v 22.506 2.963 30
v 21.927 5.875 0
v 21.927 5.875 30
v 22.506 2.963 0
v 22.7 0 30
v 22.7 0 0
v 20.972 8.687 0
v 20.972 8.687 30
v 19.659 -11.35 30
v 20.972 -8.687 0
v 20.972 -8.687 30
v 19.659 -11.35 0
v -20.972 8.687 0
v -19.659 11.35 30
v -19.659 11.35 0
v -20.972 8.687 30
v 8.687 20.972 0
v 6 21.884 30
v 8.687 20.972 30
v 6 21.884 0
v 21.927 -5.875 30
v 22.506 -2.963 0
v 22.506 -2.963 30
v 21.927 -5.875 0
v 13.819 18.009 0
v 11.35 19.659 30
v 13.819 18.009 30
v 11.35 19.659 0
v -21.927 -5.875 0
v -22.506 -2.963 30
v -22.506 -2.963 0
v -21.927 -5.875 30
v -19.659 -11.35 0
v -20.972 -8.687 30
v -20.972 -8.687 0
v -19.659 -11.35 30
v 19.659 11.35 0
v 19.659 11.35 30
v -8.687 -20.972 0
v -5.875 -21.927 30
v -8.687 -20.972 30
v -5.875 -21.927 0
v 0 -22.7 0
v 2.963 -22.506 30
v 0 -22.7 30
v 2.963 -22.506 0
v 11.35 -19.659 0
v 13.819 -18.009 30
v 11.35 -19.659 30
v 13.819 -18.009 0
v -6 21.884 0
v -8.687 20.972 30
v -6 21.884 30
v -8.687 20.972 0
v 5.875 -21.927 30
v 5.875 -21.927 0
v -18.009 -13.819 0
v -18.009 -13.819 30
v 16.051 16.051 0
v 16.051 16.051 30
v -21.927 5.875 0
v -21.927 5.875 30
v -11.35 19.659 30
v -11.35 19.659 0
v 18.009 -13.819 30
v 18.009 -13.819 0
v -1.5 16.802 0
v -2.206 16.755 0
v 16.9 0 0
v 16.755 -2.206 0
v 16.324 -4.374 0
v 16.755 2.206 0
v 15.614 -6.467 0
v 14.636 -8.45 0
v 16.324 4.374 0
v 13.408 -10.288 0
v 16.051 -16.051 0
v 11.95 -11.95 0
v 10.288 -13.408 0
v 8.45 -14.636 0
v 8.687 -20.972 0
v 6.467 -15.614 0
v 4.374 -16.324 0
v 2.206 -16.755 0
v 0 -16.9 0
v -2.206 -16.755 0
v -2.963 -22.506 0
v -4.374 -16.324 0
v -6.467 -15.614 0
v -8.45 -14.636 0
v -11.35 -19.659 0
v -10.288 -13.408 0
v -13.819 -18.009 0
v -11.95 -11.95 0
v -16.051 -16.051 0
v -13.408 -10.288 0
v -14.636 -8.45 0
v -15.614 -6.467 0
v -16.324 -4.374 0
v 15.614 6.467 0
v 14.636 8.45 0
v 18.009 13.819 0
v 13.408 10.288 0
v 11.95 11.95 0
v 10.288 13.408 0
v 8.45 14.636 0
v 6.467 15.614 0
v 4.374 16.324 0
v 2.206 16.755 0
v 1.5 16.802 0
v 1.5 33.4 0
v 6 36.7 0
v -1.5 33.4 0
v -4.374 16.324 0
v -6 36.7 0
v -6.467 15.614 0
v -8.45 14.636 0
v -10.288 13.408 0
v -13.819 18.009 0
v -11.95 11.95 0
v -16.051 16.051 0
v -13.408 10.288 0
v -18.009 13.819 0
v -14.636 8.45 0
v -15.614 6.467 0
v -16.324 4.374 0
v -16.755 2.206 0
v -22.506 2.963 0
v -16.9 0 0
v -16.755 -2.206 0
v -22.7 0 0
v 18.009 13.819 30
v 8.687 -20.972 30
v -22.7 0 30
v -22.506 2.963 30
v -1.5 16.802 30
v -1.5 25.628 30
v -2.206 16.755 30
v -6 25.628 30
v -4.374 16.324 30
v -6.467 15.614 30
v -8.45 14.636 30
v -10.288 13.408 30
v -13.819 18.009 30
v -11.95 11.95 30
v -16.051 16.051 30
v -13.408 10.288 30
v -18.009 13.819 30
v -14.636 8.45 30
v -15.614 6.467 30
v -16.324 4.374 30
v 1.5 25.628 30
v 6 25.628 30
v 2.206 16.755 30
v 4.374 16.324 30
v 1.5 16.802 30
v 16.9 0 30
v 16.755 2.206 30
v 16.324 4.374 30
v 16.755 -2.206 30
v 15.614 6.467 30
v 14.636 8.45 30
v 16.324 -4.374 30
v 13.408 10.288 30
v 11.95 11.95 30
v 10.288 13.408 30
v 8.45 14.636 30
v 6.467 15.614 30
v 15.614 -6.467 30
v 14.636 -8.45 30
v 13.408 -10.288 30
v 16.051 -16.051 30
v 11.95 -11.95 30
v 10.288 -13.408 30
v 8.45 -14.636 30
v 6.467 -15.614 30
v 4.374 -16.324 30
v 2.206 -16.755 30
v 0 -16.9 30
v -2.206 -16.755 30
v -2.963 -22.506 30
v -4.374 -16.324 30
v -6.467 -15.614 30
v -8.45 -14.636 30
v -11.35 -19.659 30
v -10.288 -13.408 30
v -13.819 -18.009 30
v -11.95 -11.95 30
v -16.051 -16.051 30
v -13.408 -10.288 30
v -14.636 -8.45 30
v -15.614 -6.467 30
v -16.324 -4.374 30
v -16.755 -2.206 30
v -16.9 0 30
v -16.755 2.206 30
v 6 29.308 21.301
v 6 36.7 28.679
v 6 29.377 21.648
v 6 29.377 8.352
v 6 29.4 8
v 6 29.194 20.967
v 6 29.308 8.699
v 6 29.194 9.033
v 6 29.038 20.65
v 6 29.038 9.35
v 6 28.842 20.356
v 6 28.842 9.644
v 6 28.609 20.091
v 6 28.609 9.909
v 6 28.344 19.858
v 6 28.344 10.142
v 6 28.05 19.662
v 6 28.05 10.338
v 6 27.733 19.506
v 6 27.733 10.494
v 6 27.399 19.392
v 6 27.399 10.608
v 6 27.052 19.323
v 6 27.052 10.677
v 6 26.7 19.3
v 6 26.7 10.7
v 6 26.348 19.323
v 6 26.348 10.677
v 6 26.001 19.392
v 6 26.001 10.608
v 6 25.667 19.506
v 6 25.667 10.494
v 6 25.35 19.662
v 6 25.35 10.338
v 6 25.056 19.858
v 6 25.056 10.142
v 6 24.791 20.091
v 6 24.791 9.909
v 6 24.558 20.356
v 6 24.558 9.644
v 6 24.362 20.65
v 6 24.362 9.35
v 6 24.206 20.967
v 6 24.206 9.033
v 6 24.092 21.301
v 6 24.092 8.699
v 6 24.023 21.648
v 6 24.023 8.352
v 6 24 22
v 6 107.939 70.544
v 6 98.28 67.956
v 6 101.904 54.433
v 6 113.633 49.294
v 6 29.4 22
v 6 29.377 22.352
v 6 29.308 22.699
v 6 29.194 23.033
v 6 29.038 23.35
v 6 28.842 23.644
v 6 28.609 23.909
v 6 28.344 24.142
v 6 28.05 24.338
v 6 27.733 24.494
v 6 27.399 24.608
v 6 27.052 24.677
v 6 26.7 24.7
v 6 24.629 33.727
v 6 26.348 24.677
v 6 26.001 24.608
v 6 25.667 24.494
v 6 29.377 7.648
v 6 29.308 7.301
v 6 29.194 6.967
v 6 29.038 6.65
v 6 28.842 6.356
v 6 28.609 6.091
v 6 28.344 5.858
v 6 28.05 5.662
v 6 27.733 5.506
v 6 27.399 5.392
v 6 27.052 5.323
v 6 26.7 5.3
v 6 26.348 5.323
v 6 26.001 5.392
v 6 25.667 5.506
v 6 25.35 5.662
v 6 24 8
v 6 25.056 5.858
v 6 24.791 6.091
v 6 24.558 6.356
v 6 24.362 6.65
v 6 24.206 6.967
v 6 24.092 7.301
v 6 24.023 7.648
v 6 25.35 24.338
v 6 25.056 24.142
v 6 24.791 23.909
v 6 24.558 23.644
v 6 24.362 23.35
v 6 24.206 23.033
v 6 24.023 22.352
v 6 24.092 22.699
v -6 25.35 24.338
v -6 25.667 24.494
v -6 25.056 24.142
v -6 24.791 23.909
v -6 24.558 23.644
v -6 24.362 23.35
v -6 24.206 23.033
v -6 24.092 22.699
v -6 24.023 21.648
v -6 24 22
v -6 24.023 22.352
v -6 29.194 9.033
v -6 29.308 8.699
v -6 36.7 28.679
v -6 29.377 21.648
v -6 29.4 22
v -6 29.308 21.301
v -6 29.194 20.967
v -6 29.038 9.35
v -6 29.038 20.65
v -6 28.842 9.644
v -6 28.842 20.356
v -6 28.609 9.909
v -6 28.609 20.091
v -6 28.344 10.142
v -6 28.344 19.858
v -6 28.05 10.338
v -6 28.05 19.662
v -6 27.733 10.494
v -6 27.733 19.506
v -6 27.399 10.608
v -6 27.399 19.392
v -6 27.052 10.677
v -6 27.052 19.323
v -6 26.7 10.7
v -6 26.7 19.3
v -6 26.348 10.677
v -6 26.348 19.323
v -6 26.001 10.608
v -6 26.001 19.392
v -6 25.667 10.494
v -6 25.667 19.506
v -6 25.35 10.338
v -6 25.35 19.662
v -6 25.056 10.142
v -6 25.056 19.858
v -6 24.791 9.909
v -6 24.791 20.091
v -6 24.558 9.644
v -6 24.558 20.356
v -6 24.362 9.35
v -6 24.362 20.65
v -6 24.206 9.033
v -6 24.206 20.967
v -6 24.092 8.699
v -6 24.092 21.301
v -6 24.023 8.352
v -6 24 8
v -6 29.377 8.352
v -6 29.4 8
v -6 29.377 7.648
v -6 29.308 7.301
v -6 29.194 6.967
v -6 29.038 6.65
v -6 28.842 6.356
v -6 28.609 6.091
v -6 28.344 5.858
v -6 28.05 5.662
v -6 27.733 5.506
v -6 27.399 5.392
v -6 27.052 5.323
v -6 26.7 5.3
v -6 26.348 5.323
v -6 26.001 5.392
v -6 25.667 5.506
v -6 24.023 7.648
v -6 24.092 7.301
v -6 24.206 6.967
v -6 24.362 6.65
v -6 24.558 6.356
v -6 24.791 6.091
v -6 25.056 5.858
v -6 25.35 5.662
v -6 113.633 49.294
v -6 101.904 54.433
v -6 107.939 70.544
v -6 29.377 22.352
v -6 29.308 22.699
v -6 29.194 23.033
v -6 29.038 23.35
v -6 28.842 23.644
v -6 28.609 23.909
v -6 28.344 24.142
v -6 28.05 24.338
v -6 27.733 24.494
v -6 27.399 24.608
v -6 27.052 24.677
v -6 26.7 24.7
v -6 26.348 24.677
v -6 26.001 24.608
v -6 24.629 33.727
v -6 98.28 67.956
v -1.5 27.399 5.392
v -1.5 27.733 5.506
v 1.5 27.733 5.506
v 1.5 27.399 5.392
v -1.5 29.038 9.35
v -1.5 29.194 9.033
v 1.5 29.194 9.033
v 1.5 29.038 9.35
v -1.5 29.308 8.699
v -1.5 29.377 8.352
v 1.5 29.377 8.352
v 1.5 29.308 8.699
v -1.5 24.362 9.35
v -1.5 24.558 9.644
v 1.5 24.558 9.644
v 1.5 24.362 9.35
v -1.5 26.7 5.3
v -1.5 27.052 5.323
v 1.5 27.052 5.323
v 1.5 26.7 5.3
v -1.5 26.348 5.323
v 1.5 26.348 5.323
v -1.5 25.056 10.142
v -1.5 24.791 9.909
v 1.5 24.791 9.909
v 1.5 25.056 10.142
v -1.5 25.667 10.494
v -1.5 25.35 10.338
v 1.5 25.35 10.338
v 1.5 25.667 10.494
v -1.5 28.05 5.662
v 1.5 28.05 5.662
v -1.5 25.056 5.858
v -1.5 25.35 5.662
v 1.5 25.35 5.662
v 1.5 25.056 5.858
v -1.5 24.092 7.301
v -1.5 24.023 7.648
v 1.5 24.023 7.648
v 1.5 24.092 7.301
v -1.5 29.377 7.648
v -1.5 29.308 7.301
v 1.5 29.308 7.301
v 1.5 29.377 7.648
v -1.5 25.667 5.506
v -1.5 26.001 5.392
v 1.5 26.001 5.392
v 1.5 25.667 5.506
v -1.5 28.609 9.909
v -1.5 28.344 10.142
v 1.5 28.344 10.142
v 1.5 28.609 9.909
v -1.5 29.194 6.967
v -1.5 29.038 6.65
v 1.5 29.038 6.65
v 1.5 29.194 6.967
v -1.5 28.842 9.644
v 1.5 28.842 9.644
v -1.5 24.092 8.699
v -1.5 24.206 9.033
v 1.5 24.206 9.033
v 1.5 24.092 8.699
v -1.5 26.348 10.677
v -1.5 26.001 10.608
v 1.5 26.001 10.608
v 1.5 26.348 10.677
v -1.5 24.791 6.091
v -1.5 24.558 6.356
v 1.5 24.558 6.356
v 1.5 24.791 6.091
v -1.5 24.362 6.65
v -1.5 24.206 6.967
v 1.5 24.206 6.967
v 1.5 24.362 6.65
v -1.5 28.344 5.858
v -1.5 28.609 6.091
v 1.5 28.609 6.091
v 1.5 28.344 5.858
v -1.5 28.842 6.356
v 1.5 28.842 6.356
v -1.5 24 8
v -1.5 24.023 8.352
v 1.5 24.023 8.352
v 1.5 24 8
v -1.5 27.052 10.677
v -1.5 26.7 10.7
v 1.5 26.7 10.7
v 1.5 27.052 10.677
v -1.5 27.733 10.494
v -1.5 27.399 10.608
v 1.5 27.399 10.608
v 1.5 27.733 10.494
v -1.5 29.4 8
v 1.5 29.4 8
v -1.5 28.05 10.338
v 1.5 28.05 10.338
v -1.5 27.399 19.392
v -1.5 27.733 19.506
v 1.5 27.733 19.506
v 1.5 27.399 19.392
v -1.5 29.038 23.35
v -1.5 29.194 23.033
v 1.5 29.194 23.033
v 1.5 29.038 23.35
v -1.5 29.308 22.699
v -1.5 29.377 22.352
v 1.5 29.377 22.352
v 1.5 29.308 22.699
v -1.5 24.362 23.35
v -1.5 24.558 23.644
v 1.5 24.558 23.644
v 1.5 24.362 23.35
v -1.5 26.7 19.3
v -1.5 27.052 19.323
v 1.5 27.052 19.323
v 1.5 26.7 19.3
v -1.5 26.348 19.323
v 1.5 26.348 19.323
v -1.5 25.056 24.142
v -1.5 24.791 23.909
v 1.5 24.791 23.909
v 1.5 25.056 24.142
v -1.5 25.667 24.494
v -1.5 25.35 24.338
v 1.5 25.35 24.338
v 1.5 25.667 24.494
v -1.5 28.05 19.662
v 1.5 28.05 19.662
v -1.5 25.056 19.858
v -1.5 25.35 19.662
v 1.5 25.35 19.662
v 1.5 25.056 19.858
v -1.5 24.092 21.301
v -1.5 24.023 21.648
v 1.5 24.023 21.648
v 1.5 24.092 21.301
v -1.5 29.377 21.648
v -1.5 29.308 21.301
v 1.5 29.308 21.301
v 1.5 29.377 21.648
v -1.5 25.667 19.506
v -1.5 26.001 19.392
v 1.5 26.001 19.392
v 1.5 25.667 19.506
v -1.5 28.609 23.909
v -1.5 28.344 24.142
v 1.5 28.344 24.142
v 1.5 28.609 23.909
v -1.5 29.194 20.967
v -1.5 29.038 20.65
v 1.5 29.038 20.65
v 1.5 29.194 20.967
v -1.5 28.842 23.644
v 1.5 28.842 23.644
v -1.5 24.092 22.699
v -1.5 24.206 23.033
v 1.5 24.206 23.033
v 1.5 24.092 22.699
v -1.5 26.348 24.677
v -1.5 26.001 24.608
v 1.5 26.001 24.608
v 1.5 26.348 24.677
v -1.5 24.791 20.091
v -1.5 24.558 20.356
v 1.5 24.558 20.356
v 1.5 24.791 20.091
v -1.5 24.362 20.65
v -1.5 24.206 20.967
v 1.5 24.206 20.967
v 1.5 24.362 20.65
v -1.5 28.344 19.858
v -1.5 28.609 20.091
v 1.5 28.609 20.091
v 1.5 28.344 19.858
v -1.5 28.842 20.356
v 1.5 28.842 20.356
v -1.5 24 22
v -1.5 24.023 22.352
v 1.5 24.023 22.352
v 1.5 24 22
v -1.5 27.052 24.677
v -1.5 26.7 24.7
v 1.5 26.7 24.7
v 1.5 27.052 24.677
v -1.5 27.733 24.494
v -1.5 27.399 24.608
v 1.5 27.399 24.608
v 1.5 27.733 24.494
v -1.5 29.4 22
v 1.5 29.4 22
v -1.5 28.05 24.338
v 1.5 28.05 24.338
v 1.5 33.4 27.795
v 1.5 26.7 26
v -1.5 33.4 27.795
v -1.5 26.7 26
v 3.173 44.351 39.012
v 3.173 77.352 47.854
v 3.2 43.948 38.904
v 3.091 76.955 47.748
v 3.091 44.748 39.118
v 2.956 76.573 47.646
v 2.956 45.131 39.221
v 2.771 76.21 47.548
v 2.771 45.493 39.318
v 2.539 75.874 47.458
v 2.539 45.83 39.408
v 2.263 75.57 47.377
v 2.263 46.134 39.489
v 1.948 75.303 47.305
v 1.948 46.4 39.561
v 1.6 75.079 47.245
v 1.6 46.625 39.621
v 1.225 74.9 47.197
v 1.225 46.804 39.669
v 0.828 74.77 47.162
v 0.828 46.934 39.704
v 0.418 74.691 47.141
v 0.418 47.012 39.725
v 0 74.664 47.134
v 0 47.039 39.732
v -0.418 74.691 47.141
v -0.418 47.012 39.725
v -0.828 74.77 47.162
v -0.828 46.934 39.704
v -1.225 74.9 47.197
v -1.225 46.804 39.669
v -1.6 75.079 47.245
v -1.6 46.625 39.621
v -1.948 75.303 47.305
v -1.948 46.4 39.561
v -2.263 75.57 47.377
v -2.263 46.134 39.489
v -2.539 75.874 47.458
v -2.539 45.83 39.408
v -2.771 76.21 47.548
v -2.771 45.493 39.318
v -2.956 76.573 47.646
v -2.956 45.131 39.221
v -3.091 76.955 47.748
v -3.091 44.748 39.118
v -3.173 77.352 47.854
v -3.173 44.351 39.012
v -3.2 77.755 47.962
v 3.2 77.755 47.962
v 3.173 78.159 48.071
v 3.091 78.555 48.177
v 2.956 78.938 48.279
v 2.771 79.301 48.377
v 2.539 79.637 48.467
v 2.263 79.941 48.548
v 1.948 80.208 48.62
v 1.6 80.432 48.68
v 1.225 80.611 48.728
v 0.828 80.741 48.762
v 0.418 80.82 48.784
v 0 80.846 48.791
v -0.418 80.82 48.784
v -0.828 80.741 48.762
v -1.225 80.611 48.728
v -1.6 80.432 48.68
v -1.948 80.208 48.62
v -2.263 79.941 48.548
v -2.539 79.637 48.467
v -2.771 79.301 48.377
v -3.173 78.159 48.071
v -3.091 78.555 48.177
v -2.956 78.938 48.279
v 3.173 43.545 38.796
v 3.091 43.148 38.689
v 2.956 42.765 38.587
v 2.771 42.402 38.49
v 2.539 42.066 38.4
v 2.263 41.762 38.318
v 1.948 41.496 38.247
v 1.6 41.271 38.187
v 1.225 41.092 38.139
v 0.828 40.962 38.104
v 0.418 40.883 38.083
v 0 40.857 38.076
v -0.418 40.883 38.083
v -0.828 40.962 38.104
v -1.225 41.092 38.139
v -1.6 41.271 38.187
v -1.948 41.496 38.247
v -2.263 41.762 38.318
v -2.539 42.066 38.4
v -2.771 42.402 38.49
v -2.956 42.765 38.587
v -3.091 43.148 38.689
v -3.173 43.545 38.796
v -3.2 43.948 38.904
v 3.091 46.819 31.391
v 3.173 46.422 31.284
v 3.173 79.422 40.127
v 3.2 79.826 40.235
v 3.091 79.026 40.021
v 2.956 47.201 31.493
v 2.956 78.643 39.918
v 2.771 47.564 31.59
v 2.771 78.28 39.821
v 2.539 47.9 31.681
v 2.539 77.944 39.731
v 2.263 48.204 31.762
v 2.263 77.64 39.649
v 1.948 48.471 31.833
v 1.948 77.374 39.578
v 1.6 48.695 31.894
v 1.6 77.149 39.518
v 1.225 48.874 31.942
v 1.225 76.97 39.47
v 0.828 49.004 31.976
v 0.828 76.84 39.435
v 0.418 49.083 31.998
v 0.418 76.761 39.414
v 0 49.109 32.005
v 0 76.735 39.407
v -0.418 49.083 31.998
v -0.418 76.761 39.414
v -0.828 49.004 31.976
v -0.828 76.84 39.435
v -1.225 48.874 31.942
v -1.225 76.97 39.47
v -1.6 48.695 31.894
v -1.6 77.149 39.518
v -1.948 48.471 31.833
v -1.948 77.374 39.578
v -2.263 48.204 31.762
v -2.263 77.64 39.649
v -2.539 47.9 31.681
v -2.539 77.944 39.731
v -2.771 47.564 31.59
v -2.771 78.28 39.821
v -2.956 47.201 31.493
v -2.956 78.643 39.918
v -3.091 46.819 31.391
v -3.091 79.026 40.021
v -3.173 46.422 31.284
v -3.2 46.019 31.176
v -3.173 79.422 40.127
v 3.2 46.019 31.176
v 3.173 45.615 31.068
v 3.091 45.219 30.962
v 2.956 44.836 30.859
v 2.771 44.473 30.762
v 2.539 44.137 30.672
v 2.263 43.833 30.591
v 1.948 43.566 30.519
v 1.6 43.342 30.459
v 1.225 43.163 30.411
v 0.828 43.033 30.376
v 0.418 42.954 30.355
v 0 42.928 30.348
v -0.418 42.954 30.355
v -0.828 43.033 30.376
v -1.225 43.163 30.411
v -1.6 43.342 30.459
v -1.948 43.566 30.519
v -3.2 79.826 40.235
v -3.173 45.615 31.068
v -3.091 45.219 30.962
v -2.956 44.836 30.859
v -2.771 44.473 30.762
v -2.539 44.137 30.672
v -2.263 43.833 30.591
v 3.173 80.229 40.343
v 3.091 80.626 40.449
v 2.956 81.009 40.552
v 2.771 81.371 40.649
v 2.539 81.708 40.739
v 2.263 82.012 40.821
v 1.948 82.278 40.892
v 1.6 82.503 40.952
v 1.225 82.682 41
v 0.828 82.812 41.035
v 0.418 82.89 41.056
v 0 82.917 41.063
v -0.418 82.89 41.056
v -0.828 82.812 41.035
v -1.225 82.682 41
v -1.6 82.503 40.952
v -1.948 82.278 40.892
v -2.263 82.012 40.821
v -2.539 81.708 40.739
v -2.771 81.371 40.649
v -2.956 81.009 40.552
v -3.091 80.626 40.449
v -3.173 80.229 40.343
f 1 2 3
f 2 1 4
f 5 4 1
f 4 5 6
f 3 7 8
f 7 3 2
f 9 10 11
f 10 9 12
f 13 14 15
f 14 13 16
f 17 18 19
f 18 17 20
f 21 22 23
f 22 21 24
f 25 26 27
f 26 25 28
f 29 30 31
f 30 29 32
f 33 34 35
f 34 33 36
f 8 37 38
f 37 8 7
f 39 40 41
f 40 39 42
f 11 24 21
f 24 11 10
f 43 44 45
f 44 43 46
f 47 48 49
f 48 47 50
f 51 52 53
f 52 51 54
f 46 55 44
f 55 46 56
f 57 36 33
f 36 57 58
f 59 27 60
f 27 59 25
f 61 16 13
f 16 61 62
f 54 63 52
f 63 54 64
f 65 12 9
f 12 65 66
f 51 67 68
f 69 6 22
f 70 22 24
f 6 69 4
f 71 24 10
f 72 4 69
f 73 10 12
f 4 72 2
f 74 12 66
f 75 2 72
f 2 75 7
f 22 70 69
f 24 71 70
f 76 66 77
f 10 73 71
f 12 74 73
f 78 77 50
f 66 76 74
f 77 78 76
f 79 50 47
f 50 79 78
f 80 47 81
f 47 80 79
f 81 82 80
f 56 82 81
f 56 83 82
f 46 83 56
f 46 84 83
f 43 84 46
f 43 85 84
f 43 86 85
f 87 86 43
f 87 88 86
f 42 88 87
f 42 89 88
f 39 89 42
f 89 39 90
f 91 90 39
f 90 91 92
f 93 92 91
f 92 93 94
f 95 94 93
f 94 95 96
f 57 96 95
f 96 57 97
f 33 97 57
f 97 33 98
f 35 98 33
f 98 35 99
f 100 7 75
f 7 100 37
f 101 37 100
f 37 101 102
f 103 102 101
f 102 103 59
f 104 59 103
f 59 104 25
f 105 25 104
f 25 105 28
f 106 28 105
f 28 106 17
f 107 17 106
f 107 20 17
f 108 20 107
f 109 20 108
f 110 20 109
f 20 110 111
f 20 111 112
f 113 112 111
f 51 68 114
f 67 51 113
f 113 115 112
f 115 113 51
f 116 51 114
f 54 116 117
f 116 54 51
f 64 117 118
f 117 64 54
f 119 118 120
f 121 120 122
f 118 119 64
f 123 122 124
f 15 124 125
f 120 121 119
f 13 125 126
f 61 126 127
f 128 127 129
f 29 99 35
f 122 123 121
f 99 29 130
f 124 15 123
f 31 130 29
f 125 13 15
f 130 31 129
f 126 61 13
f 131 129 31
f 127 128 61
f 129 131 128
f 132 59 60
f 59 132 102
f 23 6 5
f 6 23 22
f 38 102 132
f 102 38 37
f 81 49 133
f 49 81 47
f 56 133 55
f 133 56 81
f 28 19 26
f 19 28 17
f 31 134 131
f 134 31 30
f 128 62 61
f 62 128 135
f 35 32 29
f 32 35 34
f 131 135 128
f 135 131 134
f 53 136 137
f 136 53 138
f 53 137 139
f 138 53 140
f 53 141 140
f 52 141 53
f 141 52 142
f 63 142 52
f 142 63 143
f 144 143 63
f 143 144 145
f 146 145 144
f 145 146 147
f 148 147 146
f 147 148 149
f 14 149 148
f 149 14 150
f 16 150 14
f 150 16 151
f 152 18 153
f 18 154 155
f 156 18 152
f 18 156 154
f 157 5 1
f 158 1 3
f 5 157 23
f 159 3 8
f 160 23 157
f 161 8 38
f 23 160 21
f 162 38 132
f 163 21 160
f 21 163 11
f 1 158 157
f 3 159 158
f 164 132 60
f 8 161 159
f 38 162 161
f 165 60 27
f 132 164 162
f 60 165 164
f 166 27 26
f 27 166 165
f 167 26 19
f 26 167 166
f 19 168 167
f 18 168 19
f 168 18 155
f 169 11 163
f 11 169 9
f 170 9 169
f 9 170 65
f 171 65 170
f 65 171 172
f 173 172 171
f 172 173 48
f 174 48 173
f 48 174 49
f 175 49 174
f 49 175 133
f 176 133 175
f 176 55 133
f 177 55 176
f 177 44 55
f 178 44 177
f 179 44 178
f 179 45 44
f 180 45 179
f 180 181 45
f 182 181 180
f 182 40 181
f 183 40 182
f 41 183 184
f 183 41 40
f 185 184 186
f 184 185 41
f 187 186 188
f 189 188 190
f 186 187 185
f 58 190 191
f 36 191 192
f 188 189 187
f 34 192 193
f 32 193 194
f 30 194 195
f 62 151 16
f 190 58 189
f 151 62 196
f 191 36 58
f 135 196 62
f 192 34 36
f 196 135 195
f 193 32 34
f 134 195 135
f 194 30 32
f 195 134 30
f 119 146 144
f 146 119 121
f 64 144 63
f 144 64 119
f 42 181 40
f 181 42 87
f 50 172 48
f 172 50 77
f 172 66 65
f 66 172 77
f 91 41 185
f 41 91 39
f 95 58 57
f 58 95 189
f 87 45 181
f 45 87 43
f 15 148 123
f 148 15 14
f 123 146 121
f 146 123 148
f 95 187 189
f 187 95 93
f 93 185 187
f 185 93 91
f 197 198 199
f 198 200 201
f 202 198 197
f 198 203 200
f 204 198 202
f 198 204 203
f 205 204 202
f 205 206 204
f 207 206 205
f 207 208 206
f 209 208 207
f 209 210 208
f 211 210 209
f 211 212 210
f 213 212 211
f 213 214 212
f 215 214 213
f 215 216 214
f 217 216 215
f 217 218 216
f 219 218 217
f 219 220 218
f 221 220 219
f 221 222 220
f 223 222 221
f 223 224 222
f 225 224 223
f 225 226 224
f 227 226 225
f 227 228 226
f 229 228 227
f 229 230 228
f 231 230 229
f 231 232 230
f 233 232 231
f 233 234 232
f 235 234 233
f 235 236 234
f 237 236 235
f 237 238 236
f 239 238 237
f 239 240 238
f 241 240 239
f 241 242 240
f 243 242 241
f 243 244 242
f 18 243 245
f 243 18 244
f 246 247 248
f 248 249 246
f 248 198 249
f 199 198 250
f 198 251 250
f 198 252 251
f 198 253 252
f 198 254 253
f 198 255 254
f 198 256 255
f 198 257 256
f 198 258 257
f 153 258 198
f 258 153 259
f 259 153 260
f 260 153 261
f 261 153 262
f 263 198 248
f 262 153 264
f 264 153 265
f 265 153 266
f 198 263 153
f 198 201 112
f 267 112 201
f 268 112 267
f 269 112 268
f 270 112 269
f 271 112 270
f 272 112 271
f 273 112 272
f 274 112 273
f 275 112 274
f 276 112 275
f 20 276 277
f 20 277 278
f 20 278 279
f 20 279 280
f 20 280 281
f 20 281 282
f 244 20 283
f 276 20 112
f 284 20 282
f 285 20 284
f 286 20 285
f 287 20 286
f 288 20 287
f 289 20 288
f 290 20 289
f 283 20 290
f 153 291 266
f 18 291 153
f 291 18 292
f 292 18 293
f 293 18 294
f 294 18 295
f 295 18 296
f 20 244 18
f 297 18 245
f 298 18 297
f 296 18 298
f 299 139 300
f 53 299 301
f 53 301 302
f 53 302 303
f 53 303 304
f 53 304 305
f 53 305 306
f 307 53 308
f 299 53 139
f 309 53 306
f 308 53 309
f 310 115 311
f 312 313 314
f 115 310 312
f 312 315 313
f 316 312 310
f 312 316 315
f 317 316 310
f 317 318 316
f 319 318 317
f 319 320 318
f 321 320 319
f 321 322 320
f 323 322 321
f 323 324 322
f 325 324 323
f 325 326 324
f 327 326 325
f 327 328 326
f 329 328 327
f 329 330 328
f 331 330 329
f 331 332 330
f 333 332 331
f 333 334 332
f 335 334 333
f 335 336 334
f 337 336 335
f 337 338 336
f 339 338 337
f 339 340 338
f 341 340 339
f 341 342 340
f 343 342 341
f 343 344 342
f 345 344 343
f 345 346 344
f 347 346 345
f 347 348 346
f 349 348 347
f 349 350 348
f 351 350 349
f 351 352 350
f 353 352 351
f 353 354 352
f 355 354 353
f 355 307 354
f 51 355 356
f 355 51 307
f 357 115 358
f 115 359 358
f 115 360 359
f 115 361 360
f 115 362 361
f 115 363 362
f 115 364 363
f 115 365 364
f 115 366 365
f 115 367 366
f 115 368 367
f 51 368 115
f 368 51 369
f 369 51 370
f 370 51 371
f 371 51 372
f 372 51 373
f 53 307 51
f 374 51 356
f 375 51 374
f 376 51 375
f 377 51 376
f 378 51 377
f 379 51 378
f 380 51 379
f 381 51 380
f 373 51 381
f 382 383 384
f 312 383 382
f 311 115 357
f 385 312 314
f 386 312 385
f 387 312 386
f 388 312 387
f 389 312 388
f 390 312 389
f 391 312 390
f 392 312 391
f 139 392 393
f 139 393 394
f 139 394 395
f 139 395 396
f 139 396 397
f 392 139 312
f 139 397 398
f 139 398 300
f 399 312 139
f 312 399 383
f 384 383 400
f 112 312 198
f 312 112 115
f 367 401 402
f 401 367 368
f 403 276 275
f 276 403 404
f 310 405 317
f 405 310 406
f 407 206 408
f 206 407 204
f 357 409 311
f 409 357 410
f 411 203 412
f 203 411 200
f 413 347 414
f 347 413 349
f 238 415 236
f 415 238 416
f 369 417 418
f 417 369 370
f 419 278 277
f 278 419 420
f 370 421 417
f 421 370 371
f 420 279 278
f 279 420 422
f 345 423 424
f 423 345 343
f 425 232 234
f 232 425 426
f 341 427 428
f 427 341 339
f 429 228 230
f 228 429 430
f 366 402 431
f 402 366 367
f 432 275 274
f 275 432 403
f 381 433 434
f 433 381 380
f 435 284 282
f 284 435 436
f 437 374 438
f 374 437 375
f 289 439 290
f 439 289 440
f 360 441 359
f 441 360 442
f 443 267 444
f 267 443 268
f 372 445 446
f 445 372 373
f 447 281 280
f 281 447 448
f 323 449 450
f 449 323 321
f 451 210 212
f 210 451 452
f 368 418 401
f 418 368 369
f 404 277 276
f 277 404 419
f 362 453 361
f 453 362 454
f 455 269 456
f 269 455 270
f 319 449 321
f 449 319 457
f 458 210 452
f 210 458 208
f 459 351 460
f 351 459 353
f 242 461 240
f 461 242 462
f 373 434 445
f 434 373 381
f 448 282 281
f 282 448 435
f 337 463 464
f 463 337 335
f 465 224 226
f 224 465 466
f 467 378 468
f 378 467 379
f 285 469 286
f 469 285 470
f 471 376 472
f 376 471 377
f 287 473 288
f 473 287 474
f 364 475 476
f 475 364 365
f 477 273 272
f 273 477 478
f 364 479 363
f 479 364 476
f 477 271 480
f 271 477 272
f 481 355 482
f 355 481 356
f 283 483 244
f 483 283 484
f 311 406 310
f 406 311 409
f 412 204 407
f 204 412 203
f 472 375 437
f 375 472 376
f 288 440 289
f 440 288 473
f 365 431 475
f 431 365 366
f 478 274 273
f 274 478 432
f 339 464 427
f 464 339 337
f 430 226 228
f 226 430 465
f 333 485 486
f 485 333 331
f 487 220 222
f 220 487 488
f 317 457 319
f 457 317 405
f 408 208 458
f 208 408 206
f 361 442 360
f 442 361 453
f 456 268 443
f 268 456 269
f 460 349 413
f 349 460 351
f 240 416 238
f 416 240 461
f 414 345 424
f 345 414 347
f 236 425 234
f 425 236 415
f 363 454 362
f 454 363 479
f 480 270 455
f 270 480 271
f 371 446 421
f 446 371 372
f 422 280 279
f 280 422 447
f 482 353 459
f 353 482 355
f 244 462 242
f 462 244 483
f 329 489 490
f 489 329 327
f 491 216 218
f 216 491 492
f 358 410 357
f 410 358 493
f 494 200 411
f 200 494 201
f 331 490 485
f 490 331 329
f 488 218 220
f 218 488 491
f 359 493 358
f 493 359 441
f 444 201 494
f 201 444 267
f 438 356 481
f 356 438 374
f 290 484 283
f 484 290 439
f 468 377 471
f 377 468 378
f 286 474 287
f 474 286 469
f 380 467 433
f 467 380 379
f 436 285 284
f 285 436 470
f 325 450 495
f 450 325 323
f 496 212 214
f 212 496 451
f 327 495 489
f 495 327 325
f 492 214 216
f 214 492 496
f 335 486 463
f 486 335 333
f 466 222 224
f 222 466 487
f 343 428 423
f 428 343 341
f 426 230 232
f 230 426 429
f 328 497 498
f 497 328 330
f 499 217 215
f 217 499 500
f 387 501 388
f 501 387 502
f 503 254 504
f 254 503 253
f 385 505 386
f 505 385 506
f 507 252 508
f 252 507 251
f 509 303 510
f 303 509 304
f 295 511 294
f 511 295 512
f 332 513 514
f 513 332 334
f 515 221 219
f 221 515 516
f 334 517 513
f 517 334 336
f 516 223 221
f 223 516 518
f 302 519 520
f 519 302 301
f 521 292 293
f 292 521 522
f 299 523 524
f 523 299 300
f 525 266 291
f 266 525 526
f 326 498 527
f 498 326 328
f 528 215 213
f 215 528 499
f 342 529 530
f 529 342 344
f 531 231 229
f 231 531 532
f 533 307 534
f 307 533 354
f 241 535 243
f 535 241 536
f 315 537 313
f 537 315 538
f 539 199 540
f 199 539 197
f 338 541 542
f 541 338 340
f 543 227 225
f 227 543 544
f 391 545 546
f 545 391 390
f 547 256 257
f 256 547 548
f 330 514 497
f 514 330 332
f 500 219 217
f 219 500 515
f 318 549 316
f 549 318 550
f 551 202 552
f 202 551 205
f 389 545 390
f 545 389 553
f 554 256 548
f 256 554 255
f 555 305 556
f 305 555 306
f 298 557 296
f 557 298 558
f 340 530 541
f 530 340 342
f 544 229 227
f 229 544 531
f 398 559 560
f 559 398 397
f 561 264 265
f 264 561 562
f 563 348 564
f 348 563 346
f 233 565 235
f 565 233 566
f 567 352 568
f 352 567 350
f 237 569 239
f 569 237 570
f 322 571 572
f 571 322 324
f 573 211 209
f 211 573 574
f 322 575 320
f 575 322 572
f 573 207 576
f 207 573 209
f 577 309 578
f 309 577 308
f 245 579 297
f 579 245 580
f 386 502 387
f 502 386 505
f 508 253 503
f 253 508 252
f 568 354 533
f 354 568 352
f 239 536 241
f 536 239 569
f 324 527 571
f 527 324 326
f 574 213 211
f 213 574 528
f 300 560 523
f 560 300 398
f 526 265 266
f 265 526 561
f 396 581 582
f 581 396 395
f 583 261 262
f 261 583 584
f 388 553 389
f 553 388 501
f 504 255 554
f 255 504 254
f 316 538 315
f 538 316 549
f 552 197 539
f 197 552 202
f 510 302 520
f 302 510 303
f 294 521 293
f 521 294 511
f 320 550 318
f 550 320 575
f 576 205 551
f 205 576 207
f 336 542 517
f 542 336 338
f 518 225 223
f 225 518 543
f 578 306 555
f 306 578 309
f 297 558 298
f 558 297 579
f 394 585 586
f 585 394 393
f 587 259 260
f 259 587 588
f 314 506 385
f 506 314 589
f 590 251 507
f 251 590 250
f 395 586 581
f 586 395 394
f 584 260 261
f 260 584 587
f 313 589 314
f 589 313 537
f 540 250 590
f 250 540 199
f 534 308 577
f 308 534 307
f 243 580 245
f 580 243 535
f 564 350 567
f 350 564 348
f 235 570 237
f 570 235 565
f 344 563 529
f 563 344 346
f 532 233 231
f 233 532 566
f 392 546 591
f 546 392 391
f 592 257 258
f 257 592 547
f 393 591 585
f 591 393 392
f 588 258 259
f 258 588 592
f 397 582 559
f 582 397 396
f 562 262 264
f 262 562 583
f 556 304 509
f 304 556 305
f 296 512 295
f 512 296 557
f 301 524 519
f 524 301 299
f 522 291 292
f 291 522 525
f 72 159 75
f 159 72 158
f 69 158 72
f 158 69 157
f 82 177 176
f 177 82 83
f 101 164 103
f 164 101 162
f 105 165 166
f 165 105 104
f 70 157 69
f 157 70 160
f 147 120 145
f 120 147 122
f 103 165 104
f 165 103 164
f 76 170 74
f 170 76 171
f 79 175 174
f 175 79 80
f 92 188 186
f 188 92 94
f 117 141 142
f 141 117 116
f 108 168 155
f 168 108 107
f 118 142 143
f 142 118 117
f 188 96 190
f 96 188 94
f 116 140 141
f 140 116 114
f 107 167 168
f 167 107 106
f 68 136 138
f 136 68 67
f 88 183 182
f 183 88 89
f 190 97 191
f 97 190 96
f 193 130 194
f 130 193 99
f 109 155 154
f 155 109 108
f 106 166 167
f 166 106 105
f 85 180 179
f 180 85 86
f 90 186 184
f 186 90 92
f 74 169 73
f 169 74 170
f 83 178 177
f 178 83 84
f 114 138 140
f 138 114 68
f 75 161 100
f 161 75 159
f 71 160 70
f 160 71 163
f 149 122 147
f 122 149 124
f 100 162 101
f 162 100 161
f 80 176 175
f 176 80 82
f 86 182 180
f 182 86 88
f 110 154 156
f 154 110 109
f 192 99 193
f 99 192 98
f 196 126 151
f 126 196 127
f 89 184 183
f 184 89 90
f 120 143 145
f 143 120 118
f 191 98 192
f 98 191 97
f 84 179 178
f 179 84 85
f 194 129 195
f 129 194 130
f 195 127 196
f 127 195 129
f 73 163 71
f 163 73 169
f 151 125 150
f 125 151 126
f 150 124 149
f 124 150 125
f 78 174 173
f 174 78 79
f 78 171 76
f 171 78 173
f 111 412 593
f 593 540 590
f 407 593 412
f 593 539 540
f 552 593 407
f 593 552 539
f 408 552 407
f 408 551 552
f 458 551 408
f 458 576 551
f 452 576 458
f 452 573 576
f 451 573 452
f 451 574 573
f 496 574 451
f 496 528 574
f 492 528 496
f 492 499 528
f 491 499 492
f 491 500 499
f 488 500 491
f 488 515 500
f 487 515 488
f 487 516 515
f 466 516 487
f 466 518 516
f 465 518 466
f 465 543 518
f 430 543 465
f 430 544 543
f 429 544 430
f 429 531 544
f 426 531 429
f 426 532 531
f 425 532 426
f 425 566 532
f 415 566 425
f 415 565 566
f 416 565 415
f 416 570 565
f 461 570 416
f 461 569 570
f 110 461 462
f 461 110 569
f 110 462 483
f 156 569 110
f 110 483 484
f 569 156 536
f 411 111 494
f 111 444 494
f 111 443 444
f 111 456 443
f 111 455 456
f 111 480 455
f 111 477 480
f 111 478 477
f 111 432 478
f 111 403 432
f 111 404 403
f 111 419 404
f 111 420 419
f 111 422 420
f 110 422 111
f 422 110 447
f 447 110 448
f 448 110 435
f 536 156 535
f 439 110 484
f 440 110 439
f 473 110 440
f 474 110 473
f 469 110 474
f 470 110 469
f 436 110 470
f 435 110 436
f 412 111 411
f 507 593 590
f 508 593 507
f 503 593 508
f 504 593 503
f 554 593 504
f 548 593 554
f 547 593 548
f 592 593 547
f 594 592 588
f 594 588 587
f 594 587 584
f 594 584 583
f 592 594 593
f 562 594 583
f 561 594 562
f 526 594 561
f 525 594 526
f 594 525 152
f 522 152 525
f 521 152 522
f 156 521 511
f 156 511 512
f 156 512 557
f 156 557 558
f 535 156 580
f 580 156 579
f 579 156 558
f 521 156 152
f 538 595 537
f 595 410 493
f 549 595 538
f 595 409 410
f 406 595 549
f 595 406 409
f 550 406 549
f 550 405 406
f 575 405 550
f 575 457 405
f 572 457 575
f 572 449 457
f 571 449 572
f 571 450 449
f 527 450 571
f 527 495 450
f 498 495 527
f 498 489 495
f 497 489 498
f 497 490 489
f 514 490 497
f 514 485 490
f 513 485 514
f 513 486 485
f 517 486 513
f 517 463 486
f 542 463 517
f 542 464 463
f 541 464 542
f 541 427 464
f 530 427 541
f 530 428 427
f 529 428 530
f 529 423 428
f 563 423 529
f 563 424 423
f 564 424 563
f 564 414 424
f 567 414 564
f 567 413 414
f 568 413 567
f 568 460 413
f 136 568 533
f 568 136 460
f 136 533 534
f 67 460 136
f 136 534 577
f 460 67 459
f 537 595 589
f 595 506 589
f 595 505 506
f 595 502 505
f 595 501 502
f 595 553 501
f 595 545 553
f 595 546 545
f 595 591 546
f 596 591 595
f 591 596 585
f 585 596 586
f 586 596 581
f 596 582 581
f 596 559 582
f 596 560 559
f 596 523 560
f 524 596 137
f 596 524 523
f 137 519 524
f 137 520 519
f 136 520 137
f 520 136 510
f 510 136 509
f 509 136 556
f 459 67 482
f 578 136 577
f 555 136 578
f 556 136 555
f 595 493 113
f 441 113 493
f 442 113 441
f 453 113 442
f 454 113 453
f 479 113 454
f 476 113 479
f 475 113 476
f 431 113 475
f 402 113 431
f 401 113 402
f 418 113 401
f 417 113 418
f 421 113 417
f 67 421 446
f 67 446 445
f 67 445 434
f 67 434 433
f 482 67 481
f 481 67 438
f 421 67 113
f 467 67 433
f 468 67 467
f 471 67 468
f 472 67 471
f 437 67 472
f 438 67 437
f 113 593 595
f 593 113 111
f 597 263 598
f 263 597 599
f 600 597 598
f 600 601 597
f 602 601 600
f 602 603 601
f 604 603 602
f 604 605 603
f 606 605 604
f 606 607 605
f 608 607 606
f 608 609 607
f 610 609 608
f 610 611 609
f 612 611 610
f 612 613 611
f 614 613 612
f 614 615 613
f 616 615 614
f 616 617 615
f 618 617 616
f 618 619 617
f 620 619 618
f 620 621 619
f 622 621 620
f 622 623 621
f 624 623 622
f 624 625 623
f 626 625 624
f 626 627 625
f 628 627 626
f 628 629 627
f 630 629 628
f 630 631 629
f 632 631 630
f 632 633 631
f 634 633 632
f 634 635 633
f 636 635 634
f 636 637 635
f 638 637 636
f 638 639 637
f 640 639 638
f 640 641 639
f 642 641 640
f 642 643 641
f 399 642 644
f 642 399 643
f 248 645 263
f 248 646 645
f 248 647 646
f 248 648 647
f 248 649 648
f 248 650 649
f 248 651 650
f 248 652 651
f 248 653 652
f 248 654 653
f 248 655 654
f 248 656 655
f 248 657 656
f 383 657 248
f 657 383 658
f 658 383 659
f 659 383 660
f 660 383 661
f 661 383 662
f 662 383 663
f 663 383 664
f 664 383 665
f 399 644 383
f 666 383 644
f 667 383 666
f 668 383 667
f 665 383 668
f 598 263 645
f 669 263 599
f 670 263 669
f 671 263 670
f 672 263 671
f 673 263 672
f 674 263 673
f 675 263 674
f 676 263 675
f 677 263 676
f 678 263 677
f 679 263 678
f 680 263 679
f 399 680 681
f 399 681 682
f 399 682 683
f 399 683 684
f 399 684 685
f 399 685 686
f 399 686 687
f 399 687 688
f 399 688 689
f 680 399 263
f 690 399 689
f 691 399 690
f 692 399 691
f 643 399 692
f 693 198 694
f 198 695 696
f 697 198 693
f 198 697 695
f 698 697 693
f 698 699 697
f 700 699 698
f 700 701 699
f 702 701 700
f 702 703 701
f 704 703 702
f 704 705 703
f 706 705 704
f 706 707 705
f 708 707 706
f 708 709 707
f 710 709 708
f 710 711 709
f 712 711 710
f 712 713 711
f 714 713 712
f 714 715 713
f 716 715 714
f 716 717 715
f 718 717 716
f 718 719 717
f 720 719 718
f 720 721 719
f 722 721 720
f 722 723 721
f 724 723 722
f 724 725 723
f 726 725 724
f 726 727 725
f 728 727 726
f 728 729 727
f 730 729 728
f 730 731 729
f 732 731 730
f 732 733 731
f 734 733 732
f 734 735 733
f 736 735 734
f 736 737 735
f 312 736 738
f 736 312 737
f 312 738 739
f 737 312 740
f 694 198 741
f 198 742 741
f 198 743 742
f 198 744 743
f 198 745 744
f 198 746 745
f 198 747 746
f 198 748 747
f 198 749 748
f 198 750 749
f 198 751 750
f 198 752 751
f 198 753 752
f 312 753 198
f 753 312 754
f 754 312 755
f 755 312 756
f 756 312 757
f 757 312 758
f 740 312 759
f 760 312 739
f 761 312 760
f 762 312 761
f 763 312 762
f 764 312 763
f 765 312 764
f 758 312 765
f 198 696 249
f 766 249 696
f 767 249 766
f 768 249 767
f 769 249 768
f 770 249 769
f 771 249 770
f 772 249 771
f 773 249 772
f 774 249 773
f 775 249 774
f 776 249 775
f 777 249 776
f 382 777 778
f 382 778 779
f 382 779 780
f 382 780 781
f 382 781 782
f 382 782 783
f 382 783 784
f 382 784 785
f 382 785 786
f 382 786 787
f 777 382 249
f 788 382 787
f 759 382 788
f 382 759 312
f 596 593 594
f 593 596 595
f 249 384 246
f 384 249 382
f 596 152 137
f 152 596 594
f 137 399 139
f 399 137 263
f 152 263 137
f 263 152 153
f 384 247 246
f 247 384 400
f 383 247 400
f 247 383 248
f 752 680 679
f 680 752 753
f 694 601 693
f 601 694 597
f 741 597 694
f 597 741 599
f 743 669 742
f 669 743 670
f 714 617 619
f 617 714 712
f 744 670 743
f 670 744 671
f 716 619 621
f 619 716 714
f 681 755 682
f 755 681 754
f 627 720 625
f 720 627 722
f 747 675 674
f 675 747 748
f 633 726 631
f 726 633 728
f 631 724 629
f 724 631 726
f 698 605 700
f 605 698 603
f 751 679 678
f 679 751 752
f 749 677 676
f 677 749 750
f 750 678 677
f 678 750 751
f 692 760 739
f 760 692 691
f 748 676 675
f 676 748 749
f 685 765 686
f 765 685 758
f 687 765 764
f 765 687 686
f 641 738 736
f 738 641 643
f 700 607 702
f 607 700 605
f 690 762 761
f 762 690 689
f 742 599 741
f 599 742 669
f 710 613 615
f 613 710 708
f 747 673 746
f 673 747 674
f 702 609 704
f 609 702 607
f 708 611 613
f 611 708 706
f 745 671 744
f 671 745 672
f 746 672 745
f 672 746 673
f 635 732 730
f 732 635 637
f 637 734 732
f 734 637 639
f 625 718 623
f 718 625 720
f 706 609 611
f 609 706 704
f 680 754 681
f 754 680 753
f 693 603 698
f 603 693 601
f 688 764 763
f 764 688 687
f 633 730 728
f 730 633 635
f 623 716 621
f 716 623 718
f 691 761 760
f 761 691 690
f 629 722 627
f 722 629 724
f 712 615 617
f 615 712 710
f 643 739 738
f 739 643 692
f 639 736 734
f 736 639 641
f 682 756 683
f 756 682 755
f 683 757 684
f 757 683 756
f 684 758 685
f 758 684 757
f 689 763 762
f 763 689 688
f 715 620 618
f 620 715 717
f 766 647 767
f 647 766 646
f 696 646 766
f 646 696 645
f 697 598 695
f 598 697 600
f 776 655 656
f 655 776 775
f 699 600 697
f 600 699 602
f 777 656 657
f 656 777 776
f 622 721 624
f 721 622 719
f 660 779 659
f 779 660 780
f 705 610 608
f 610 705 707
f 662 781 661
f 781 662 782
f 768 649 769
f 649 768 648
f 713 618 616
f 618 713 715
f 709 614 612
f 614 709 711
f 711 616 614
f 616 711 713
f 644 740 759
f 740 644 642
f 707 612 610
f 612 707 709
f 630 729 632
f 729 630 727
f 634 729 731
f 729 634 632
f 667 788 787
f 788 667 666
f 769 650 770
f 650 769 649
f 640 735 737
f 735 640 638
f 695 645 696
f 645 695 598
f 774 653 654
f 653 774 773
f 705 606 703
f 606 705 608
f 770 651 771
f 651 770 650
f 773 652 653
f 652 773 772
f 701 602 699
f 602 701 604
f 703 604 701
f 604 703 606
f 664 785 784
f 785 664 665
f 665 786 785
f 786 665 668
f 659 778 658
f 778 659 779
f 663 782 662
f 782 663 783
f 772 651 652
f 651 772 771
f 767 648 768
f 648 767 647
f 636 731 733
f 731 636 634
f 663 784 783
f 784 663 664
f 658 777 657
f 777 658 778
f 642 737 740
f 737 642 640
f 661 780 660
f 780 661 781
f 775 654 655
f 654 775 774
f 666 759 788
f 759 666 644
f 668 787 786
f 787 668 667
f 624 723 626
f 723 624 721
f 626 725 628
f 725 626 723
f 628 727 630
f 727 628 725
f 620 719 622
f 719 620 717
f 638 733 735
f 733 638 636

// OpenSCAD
// ============================================================
//  HidroSopó — Soporte de panel solar
//  Inclinación 15° orientación sur (Sopó, lat 4.9° N)
//  El ángulo es para autolimpieza por lluvia, no para captación.
//  Imprimir en PETG/ASA. 4 unidades (uno por esquina del panel).
// ============================================================

angulo     = 15;
poste_d    = 33.4;   // tubo galvanizado 1" (verificar)
tol        = 0.4;
$fn = 48;

module abrazadera_poste() {
    difference() {
        union() {
            cylinder(h = 30, d = poste_d + 12);
            translate([-6, 0, 0]) cube([12, poste_d/2 + 20, 30]);
        }
        translate([0,0,-1]) cylinder(h = 32, d = poste_d + tol);
        // corte de apriete
        translate([-1.5, 0, -1]) cube([3, poste_d, 32]);
        // tornillos M5 de apriete
        for (z = [8, 22])
            translate([-20, poste_d/2 + 10, z]) rotate([0,90,0])
                cylinder(h = 40, d = 5.4);
    }
}

module brazo_inclinado() {
    rotate([angulo, 0, 0])
    difference() {
        union() {
            cube([12, 90, 8]);
            translate([0, 80, 0]) cube([12, 10, 22]);
        }
        // tornillos M6 al marco del panel
        for (y = [20, 55])
            translate([6, y, -1]) cylinder(h = 12, d = 6.4);
    }
}

module soporte() {
    abrazadera_poste();
    translate([-6, poste_d/2 + 10, 26]) brazo_inclinado();
}

soporte();
